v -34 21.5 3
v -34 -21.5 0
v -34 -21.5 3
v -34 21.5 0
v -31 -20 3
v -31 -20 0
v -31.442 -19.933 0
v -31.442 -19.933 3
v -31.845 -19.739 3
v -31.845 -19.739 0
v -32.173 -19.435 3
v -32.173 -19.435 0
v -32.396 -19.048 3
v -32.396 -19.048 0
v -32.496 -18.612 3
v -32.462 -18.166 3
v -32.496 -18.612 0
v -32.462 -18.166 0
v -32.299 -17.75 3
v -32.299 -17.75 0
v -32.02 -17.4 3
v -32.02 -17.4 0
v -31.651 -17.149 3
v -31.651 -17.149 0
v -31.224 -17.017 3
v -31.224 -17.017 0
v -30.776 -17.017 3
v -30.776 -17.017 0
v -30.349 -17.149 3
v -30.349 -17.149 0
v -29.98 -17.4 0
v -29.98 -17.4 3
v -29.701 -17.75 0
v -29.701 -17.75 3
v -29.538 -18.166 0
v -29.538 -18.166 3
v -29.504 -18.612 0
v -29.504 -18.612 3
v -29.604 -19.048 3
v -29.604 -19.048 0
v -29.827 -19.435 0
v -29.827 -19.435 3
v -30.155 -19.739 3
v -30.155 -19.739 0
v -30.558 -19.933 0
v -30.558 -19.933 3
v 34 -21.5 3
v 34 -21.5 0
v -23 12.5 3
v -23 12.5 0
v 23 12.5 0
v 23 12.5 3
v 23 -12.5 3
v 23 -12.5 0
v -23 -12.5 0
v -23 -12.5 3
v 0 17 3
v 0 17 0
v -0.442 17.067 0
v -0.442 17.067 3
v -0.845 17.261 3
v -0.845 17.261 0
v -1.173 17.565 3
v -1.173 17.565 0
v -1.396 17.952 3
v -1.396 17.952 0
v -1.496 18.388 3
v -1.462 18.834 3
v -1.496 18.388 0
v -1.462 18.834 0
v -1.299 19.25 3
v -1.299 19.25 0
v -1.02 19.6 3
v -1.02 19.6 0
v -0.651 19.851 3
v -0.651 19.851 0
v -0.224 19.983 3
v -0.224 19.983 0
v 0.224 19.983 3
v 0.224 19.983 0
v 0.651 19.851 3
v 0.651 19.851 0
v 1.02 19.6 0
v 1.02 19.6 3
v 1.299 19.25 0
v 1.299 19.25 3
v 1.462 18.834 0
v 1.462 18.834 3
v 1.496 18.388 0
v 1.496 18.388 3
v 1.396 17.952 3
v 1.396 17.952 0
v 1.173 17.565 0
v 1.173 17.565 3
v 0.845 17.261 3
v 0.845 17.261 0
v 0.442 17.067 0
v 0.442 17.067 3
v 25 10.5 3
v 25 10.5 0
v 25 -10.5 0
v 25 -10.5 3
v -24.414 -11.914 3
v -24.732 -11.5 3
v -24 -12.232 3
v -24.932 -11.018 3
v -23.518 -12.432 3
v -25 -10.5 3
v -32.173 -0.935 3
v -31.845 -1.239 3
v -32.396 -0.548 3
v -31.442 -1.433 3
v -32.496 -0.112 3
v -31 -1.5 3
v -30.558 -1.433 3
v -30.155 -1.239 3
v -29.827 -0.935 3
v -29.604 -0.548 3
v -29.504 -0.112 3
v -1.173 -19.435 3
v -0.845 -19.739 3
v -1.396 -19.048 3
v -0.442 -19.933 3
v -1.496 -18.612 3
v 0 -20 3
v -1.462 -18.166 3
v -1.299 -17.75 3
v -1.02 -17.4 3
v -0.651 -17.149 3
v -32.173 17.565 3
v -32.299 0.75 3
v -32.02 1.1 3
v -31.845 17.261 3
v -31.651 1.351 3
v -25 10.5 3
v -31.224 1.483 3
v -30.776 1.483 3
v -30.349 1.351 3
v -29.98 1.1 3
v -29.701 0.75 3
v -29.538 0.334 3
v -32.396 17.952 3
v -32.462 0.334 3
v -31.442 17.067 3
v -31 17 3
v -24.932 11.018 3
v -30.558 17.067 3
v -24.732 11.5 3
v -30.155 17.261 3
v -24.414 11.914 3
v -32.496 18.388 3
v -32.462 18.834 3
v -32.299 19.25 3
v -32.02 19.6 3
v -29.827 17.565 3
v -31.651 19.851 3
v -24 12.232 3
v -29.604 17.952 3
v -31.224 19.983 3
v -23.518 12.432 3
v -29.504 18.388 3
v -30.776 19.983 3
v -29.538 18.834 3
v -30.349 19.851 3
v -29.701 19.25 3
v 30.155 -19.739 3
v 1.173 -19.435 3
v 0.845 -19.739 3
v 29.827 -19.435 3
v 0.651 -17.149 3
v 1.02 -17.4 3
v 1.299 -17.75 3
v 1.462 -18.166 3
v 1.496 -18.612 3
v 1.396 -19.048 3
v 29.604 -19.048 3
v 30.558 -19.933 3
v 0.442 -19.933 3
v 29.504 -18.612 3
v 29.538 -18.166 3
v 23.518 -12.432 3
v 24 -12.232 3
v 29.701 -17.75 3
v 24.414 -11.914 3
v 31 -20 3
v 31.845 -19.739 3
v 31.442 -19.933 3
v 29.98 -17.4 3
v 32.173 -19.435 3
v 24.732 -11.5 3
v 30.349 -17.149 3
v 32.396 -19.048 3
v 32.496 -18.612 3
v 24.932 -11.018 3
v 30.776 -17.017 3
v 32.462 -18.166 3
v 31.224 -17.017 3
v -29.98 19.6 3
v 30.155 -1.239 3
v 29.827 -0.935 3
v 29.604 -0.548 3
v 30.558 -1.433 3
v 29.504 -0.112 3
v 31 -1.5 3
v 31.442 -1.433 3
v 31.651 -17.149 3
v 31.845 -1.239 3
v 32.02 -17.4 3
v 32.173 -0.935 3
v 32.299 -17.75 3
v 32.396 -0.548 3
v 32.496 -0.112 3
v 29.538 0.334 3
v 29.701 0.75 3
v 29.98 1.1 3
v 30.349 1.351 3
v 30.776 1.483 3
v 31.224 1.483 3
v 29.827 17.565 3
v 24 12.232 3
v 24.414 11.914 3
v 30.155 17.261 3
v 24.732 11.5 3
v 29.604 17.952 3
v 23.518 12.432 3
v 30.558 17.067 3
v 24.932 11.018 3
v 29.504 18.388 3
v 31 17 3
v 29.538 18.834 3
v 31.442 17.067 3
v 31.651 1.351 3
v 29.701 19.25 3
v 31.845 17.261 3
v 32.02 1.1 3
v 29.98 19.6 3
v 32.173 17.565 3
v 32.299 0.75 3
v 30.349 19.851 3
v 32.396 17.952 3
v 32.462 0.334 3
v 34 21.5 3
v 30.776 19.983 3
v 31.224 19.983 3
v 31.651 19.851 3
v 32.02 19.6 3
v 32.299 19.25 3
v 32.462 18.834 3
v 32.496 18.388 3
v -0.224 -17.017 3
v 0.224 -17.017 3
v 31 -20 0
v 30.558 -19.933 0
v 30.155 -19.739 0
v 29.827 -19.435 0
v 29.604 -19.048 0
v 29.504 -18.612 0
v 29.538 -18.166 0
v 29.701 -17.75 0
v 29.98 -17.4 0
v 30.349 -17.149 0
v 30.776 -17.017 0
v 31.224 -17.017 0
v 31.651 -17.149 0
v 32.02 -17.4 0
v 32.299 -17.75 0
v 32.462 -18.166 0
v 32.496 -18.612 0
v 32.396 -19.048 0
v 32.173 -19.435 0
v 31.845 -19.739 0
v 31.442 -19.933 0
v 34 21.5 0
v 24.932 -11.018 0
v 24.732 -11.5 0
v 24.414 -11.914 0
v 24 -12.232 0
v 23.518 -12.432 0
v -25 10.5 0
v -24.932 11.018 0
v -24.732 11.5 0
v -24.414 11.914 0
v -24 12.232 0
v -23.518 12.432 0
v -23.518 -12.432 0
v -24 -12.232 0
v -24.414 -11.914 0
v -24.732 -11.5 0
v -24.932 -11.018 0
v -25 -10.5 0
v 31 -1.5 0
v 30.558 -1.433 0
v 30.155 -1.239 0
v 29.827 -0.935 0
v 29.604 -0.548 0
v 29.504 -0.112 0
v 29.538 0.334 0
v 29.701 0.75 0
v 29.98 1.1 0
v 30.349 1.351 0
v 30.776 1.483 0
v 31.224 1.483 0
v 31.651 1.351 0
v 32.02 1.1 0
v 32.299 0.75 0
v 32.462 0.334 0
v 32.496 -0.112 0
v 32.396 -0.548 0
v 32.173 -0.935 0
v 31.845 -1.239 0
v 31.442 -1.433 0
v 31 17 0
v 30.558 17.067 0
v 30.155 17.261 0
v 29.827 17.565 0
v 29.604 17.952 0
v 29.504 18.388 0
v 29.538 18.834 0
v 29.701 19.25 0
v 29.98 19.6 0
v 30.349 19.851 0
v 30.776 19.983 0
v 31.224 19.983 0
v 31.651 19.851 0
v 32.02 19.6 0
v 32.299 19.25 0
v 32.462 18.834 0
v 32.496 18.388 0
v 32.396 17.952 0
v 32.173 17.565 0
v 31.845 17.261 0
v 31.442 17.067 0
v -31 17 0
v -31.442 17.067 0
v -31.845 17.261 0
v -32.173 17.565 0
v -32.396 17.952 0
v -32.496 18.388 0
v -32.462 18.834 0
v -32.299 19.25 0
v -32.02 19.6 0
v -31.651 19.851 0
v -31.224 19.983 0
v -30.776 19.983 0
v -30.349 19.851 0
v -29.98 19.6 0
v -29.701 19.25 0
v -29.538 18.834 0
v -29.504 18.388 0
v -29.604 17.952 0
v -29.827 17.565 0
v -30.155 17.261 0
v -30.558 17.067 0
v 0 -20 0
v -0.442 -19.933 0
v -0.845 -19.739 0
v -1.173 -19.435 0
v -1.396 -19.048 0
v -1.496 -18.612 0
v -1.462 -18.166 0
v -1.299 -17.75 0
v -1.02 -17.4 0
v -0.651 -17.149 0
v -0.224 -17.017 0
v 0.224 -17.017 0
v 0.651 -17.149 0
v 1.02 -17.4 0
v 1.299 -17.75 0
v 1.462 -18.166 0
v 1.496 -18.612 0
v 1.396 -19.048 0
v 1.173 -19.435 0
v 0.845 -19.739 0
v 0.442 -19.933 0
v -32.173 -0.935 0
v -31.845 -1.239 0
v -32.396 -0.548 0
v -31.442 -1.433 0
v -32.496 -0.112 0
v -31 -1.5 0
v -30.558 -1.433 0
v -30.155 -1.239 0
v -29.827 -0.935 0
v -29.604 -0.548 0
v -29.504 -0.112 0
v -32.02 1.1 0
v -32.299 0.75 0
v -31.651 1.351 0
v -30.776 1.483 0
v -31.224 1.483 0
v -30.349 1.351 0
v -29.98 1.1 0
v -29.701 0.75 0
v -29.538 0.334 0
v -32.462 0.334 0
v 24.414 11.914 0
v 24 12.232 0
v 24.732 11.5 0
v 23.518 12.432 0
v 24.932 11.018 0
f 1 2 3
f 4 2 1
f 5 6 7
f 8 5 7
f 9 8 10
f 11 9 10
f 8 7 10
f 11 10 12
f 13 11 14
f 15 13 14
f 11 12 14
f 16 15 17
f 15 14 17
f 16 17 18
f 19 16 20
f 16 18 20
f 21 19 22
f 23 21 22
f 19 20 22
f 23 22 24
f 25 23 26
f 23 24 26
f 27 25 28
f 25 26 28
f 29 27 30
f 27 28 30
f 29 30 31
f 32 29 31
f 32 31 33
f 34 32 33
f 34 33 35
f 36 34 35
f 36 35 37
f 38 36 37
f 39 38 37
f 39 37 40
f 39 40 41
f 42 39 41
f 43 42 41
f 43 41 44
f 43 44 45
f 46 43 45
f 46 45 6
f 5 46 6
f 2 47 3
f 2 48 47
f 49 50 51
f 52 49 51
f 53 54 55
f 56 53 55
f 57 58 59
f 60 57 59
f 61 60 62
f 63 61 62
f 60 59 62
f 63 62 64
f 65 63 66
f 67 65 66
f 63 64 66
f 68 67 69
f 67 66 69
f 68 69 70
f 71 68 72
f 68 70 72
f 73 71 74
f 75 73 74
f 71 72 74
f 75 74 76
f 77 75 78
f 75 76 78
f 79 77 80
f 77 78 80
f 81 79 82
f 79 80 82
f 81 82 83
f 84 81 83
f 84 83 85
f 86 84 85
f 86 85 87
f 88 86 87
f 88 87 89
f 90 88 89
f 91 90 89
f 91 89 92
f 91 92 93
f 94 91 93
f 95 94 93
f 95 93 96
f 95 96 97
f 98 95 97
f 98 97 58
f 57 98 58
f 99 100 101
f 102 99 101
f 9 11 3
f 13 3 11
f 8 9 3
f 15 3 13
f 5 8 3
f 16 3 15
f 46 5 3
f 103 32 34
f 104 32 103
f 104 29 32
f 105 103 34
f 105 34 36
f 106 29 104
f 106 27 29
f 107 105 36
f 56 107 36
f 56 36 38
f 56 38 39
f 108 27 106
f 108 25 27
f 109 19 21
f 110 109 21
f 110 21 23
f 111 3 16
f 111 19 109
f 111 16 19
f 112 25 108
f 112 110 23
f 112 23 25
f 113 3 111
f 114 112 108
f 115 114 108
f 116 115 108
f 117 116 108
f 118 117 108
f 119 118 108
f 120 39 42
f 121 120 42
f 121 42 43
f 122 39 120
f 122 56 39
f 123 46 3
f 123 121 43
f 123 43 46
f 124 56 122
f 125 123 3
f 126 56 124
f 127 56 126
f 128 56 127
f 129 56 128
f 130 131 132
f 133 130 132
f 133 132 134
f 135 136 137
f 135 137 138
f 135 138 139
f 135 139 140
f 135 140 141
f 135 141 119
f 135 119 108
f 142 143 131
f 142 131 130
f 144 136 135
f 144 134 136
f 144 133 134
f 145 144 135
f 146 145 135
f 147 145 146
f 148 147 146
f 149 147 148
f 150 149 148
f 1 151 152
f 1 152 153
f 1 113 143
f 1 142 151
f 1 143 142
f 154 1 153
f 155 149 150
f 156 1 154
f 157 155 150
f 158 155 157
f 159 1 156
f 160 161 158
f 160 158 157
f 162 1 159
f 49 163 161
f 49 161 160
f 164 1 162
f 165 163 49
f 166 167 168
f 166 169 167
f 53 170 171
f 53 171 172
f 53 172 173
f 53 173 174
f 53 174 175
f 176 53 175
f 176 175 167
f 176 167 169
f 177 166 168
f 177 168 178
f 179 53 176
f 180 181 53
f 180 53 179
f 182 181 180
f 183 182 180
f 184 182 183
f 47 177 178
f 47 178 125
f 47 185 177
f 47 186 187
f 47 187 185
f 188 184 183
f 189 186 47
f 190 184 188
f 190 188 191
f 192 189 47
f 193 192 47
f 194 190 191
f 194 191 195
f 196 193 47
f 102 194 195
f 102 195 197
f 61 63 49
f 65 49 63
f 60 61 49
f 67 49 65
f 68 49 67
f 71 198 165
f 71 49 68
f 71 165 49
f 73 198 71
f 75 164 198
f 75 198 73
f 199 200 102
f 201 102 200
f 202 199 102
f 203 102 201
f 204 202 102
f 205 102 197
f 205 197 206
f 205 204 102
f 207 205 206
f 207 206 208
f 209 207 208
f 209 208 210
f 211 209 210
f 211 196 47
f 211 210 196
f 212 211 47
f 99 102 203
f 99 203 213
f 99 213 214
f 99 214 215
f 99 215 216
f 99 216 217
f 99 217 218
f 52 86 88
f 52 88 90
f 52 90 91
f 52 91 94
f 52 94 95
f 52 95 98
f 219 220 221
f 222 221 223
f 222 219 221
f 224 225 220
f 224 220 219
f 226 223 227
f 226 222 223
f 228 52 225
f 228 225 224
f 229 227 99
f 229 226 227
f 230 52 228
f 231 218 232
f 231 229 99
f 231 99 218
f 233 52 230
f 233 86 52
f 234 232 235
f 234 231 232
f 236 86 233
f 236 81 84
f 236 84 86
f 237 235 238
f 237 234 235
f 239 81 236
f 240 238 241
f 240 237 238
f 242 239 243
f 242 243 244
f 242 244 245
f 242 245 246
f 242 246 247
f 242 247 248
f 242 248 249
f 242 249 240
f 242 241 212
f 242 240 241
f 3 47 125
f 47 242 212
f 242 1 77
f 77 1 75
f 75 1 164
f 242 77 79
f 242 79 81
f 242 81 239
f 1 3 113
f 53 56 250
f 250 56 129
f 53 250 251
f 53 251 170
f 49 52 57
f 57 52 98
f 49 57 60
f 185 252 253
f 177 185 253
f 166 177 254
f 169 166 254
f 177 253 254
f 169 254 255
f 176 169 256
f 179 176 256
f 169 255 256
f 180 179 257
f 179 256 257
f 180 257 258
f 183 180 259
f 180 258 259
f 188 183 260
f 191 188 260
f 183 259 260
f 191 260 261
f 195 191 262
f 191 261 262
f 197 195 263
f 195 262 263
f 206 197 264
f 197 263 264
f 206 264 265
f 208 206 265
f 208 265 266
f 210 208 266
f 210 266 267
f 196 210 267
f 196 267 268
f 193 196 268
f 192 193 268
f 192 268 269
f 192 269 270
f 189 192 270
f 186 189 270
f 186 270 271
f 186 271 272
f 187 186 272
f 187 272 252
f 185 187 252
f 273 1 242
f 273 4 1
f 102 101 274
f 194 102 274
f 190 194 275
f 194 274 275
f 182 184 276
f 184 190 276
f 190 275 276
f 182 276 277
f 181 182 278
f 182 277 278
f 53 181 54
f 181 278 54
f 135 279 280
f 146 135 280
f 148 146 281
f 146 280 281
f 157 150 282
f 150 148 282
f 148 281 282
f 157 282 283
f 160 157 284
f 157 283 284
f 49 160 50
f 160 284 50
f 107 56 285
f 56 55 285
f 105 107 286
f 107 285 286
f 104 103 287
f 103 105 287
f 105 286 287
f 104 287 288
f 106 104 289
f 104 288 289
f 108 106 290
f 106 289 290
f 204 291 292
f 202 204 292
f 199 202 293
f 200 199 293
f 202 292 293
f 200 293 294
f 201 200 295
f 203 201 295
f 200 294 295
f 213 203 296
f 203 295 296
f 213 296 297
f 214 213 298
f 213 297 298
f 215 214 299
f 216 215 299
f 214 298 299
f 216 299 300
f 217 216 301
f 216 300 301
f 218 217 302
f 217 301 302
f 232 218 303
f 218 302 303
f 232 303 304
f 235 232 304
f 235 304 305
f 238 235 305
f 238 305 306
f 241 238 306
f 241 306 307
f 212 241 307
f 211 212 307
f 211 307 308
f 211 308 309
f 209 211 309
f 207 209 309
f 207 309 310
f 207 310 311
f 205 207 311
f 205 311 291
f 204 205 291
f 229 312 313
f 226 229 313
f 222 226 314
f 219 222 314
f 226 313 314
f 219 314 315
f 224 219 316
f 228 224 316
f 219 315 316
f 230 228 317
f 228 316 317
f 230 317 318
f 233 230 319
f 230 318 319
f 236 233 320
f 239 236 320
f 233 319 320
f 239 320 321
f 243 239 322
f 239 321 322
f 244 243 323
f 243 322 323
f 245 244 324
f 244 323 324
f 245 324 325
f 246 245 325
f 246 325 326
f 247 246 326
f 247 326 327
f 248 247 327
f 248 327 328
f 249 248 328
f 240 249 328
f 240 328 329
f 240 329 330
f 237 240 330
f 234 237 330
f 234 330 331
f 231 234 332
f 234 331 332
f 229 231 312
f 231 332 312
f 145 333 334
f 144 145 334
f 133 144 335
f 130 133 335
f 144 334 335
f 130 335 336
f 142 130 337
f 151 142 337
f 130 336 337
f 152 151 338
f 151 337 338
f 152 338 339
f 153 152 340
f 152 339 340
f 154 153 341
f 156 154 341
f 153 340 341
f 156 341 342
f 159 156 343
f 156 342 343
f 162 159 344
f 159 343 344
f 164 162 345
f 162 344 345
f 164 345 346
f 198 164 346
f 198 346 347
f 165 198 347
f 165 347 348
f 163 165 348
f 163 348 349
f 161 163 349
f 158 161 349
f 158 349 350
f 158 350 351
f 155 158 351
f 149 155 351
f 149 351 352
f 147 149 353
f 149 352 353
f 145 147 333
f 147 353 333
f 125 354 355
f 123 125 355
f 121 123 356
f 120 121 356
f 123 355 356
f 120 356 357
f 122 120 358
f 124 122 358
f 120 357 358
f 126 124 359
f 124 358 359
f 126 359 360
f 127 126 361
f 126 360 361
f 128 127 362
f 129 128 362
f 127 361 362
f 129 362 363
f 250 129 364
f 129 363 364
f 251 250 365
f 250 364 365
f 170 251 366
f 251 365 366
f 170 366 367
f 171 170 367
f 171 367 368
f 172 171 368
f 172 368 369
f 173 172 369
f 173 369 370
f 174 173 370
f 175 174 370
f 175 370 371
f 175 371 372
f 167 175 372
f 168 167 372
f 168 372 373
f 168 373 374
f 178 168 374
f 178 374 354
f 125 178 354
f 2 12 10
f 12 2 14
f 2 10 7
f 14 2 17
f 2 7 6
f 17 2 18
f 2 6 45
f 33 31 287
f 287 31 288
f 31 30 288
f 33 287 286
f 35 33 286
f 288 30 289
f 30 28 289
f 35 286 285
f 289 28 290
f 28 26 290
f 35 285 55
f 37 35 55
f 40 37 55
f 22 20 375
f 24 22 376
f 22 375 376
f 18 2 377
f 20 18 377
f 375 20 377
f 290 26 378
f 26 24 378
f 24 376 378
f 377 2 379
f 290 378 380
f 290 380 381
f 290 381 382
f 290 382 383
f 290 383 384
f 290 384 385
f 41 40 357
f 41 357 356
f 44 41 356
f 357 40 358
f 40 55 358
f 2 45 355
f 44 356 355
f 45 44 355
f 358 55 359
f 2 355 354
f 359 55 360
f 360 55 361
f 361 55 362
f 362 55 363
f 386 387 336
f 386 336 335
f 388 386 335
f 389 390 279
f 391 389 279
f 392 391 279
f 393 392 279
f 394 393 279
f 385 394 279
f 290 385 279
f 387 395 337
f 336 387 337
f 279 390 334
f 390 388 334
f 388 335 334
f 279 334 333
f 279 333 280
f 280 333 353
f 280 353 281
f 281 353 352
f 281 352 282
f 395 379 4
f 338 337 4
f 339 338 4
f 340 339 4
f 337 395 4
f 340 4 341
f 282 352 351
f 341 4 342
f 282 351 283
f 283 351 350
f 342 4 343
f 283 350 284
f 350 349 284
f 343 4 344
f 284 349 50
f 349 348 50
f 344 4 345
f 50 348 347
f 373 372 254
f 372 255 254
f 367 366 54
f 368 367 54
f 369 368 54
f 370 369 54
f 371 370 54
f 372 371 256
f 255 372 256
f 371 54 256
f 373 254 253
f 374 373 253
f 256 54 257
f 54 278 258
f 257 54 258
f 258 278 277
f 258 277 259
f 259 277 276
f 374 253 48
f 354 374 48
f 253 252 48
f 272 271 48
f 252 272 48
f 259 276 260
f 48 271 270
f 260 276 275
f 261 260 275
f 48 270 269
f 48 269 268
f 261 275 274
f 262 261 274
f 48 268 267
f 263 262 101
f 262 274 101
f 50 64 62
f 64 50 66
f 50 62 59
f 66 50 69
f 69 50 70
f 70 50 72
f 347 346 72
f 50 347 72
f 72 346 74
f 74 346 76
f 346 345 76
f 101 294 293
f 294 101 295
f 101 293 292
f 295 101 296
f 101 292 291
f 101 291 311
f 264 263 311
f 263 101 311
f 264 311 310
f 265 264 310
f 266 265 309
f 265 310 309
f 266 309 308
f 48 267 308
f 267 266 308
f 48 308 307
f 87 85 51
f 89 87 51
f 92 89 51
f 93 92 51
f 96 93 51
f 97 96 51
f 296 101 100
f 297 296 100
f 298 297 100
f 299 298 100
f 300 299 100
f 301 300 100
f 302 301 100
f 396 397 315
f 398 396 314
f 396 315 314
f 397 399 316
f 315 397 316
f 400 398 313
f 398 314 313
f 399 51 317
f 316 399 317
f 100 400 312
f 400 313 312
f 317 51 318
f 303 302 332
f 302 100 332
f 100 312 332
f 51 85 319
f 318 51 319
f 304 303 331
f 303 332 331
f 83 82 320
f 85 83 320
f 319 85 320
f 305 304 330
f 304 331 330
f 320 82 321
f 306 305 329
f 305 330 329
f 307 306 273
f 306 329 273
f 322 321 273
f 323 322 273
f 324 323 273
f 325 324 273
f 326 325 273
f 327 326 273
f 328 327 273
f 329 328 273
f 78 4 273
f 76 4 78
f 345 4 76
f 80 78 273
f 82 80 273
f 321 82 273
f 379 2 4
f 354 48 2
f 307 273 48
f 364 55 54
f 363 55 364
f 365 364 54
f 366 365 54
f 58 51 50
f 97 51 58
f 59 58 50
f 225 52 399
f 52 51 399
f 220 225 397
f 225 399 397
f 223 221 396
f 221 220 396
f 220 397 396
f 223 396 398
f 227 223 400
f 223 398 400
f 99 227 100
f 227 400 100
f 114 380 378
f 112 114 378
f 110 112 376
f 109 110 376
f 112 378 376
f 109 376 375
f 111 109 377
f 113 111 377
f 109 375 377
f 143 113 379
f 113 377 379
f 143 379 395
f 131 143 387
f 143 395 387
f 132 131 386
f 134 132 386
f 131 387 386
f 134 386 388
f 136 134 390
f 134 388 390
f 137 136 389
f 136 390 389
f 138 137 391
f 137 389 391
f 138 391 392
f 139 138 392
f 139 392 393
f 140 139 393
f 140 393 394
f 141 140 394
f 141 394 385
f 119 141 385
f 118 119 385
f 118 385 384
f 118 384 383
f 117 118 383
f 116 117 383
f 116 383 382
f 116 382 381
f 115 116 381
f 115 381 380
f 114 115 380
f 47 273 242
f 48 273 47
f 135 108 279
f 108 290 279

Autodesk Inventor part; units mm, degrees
ref_plane "YZ Plane" through (0, 0, 0) normal (1, 0, 0) x (0, 1, 0)
ref_plane "XZ Plane" through (0, 0, 0) normal (0, 1, 0) x (-1, 0, 0)
ref_plane "XY Plane" through (0, 0, 0) normal (0, 0, 1) x (1, 0, 0)
sketch "Sketch2" plane through (0, 0, 0) normal (0, 0, 1) x (1, 0, 0)
  line L0 (34, -21.5) -> (-34, -21.5)
  line L1 (-34, -21.5) -> (-34, 21.5)
  line L2 (-34, 21.5) -> (34, 21.5)
  line L3 (34, 21.5) -> (34, -21.5)
  line L4 (34, -21.5) -> (-34, 21.5) construction
  line L5 (-34, -21.5) -> (34, 21.5) construction
  line L6 (23, -12.5) -> (-23, -12.5)
  line L7 (-25, -10.5) -> (-25, 10.5)
  line L8 (-23, 12.5) -> (23, 12.5)
  line L9 (25, 10.5) -> (25, -10.5)
  line L10 (25, -12.5) -> (-25, 12.5) construction
  line L11 (-25, -12.5) -> (25, 12.5) construction
  arc A0 (-23, 12.5) -> (-25, 10.5) centre (-23, 10.5) ccw
  arc A1 (-25, -10.5) -> (-23, -12.5) centre (-23, -10.5) ccw
  arc A2 (23, -12.5) -> (25, -10.5) centre (23, -10.5) ccw
  arc A3 (25, 10.5) -> (23, 12.5) centre (23, 10.5) ccw
  point P0 (0, 0)
  dimension "d0" = 68
  dimension "d1" = 43
  dimension "d4" = 9
  dimension "d5" = 9
  dimension "d6" = 2
extrude "Extrusion1" add sketch "Sketch2" along normal blind 3
sketch "Sketch3" plane through (0, 0, 3) normal (0, 0, 1) x (1, 0, 0)
  line L0 (-34, -21.5) -> (34, -21.5) construction
  line L1 (34, -21.5) -> (34, 21.5) construction
  line L2 (-34, 21.5) -> (-34, -21.5) construction
  line L3 (34, 21.5) -> (-34, 21.5) construction
  line L4 (-47.6, 0) -> (47.6, 0) construction
  line L5 (0, 30.1) -> (0, -30.1) construction
  line L6 (25, 10.5) -> (25, -10.5) construction
  line L7 (-23, 12.5) -> (23, 12.5) construction
  line L8 (-25, -10.5) -> (-25, 10.5) construction
  line L9 (23, -12.5) -> (-23, -12.5) construction
  point P0 (0, 0)
  point P1 (31, -18.5)
  point P2 (31, 0)
  point P3 (31, 18.5)
  point P4 (0, 18.5)
  point P5 (-31, 18.5)
  point P6 (-31, 0)
  point P7 (-31, -18.5)
  point P8 (0, -18.5)
  dimension "d26" = 6
  dimension "d27" = 6
  dimension "d28" = 6
  dimension "d29" = 6
  dimension "d30" = 6
  dimension "d31" = 6
  dimension "d32" = 6
  dimension "d33" = 6
  dimension "d34" = 6
  dimension "d35" = 6
  dimension "d36" = 6
  dimension "d37" = 6
hole "Hole1" at (31, -18.5, 3) at (31, 0, 3) at (31, 18.5, 3) at (0, 18.5, 3) at (-31, 18.5, 3) at (-31, 0, 3) at (-31, -18.5, 3) at (0, -18.5, 3) direction (0, 0, -1) diameter 3 depth 8.8 tip angle 118
properties part number "P021_HautEcranProtecLidar"
